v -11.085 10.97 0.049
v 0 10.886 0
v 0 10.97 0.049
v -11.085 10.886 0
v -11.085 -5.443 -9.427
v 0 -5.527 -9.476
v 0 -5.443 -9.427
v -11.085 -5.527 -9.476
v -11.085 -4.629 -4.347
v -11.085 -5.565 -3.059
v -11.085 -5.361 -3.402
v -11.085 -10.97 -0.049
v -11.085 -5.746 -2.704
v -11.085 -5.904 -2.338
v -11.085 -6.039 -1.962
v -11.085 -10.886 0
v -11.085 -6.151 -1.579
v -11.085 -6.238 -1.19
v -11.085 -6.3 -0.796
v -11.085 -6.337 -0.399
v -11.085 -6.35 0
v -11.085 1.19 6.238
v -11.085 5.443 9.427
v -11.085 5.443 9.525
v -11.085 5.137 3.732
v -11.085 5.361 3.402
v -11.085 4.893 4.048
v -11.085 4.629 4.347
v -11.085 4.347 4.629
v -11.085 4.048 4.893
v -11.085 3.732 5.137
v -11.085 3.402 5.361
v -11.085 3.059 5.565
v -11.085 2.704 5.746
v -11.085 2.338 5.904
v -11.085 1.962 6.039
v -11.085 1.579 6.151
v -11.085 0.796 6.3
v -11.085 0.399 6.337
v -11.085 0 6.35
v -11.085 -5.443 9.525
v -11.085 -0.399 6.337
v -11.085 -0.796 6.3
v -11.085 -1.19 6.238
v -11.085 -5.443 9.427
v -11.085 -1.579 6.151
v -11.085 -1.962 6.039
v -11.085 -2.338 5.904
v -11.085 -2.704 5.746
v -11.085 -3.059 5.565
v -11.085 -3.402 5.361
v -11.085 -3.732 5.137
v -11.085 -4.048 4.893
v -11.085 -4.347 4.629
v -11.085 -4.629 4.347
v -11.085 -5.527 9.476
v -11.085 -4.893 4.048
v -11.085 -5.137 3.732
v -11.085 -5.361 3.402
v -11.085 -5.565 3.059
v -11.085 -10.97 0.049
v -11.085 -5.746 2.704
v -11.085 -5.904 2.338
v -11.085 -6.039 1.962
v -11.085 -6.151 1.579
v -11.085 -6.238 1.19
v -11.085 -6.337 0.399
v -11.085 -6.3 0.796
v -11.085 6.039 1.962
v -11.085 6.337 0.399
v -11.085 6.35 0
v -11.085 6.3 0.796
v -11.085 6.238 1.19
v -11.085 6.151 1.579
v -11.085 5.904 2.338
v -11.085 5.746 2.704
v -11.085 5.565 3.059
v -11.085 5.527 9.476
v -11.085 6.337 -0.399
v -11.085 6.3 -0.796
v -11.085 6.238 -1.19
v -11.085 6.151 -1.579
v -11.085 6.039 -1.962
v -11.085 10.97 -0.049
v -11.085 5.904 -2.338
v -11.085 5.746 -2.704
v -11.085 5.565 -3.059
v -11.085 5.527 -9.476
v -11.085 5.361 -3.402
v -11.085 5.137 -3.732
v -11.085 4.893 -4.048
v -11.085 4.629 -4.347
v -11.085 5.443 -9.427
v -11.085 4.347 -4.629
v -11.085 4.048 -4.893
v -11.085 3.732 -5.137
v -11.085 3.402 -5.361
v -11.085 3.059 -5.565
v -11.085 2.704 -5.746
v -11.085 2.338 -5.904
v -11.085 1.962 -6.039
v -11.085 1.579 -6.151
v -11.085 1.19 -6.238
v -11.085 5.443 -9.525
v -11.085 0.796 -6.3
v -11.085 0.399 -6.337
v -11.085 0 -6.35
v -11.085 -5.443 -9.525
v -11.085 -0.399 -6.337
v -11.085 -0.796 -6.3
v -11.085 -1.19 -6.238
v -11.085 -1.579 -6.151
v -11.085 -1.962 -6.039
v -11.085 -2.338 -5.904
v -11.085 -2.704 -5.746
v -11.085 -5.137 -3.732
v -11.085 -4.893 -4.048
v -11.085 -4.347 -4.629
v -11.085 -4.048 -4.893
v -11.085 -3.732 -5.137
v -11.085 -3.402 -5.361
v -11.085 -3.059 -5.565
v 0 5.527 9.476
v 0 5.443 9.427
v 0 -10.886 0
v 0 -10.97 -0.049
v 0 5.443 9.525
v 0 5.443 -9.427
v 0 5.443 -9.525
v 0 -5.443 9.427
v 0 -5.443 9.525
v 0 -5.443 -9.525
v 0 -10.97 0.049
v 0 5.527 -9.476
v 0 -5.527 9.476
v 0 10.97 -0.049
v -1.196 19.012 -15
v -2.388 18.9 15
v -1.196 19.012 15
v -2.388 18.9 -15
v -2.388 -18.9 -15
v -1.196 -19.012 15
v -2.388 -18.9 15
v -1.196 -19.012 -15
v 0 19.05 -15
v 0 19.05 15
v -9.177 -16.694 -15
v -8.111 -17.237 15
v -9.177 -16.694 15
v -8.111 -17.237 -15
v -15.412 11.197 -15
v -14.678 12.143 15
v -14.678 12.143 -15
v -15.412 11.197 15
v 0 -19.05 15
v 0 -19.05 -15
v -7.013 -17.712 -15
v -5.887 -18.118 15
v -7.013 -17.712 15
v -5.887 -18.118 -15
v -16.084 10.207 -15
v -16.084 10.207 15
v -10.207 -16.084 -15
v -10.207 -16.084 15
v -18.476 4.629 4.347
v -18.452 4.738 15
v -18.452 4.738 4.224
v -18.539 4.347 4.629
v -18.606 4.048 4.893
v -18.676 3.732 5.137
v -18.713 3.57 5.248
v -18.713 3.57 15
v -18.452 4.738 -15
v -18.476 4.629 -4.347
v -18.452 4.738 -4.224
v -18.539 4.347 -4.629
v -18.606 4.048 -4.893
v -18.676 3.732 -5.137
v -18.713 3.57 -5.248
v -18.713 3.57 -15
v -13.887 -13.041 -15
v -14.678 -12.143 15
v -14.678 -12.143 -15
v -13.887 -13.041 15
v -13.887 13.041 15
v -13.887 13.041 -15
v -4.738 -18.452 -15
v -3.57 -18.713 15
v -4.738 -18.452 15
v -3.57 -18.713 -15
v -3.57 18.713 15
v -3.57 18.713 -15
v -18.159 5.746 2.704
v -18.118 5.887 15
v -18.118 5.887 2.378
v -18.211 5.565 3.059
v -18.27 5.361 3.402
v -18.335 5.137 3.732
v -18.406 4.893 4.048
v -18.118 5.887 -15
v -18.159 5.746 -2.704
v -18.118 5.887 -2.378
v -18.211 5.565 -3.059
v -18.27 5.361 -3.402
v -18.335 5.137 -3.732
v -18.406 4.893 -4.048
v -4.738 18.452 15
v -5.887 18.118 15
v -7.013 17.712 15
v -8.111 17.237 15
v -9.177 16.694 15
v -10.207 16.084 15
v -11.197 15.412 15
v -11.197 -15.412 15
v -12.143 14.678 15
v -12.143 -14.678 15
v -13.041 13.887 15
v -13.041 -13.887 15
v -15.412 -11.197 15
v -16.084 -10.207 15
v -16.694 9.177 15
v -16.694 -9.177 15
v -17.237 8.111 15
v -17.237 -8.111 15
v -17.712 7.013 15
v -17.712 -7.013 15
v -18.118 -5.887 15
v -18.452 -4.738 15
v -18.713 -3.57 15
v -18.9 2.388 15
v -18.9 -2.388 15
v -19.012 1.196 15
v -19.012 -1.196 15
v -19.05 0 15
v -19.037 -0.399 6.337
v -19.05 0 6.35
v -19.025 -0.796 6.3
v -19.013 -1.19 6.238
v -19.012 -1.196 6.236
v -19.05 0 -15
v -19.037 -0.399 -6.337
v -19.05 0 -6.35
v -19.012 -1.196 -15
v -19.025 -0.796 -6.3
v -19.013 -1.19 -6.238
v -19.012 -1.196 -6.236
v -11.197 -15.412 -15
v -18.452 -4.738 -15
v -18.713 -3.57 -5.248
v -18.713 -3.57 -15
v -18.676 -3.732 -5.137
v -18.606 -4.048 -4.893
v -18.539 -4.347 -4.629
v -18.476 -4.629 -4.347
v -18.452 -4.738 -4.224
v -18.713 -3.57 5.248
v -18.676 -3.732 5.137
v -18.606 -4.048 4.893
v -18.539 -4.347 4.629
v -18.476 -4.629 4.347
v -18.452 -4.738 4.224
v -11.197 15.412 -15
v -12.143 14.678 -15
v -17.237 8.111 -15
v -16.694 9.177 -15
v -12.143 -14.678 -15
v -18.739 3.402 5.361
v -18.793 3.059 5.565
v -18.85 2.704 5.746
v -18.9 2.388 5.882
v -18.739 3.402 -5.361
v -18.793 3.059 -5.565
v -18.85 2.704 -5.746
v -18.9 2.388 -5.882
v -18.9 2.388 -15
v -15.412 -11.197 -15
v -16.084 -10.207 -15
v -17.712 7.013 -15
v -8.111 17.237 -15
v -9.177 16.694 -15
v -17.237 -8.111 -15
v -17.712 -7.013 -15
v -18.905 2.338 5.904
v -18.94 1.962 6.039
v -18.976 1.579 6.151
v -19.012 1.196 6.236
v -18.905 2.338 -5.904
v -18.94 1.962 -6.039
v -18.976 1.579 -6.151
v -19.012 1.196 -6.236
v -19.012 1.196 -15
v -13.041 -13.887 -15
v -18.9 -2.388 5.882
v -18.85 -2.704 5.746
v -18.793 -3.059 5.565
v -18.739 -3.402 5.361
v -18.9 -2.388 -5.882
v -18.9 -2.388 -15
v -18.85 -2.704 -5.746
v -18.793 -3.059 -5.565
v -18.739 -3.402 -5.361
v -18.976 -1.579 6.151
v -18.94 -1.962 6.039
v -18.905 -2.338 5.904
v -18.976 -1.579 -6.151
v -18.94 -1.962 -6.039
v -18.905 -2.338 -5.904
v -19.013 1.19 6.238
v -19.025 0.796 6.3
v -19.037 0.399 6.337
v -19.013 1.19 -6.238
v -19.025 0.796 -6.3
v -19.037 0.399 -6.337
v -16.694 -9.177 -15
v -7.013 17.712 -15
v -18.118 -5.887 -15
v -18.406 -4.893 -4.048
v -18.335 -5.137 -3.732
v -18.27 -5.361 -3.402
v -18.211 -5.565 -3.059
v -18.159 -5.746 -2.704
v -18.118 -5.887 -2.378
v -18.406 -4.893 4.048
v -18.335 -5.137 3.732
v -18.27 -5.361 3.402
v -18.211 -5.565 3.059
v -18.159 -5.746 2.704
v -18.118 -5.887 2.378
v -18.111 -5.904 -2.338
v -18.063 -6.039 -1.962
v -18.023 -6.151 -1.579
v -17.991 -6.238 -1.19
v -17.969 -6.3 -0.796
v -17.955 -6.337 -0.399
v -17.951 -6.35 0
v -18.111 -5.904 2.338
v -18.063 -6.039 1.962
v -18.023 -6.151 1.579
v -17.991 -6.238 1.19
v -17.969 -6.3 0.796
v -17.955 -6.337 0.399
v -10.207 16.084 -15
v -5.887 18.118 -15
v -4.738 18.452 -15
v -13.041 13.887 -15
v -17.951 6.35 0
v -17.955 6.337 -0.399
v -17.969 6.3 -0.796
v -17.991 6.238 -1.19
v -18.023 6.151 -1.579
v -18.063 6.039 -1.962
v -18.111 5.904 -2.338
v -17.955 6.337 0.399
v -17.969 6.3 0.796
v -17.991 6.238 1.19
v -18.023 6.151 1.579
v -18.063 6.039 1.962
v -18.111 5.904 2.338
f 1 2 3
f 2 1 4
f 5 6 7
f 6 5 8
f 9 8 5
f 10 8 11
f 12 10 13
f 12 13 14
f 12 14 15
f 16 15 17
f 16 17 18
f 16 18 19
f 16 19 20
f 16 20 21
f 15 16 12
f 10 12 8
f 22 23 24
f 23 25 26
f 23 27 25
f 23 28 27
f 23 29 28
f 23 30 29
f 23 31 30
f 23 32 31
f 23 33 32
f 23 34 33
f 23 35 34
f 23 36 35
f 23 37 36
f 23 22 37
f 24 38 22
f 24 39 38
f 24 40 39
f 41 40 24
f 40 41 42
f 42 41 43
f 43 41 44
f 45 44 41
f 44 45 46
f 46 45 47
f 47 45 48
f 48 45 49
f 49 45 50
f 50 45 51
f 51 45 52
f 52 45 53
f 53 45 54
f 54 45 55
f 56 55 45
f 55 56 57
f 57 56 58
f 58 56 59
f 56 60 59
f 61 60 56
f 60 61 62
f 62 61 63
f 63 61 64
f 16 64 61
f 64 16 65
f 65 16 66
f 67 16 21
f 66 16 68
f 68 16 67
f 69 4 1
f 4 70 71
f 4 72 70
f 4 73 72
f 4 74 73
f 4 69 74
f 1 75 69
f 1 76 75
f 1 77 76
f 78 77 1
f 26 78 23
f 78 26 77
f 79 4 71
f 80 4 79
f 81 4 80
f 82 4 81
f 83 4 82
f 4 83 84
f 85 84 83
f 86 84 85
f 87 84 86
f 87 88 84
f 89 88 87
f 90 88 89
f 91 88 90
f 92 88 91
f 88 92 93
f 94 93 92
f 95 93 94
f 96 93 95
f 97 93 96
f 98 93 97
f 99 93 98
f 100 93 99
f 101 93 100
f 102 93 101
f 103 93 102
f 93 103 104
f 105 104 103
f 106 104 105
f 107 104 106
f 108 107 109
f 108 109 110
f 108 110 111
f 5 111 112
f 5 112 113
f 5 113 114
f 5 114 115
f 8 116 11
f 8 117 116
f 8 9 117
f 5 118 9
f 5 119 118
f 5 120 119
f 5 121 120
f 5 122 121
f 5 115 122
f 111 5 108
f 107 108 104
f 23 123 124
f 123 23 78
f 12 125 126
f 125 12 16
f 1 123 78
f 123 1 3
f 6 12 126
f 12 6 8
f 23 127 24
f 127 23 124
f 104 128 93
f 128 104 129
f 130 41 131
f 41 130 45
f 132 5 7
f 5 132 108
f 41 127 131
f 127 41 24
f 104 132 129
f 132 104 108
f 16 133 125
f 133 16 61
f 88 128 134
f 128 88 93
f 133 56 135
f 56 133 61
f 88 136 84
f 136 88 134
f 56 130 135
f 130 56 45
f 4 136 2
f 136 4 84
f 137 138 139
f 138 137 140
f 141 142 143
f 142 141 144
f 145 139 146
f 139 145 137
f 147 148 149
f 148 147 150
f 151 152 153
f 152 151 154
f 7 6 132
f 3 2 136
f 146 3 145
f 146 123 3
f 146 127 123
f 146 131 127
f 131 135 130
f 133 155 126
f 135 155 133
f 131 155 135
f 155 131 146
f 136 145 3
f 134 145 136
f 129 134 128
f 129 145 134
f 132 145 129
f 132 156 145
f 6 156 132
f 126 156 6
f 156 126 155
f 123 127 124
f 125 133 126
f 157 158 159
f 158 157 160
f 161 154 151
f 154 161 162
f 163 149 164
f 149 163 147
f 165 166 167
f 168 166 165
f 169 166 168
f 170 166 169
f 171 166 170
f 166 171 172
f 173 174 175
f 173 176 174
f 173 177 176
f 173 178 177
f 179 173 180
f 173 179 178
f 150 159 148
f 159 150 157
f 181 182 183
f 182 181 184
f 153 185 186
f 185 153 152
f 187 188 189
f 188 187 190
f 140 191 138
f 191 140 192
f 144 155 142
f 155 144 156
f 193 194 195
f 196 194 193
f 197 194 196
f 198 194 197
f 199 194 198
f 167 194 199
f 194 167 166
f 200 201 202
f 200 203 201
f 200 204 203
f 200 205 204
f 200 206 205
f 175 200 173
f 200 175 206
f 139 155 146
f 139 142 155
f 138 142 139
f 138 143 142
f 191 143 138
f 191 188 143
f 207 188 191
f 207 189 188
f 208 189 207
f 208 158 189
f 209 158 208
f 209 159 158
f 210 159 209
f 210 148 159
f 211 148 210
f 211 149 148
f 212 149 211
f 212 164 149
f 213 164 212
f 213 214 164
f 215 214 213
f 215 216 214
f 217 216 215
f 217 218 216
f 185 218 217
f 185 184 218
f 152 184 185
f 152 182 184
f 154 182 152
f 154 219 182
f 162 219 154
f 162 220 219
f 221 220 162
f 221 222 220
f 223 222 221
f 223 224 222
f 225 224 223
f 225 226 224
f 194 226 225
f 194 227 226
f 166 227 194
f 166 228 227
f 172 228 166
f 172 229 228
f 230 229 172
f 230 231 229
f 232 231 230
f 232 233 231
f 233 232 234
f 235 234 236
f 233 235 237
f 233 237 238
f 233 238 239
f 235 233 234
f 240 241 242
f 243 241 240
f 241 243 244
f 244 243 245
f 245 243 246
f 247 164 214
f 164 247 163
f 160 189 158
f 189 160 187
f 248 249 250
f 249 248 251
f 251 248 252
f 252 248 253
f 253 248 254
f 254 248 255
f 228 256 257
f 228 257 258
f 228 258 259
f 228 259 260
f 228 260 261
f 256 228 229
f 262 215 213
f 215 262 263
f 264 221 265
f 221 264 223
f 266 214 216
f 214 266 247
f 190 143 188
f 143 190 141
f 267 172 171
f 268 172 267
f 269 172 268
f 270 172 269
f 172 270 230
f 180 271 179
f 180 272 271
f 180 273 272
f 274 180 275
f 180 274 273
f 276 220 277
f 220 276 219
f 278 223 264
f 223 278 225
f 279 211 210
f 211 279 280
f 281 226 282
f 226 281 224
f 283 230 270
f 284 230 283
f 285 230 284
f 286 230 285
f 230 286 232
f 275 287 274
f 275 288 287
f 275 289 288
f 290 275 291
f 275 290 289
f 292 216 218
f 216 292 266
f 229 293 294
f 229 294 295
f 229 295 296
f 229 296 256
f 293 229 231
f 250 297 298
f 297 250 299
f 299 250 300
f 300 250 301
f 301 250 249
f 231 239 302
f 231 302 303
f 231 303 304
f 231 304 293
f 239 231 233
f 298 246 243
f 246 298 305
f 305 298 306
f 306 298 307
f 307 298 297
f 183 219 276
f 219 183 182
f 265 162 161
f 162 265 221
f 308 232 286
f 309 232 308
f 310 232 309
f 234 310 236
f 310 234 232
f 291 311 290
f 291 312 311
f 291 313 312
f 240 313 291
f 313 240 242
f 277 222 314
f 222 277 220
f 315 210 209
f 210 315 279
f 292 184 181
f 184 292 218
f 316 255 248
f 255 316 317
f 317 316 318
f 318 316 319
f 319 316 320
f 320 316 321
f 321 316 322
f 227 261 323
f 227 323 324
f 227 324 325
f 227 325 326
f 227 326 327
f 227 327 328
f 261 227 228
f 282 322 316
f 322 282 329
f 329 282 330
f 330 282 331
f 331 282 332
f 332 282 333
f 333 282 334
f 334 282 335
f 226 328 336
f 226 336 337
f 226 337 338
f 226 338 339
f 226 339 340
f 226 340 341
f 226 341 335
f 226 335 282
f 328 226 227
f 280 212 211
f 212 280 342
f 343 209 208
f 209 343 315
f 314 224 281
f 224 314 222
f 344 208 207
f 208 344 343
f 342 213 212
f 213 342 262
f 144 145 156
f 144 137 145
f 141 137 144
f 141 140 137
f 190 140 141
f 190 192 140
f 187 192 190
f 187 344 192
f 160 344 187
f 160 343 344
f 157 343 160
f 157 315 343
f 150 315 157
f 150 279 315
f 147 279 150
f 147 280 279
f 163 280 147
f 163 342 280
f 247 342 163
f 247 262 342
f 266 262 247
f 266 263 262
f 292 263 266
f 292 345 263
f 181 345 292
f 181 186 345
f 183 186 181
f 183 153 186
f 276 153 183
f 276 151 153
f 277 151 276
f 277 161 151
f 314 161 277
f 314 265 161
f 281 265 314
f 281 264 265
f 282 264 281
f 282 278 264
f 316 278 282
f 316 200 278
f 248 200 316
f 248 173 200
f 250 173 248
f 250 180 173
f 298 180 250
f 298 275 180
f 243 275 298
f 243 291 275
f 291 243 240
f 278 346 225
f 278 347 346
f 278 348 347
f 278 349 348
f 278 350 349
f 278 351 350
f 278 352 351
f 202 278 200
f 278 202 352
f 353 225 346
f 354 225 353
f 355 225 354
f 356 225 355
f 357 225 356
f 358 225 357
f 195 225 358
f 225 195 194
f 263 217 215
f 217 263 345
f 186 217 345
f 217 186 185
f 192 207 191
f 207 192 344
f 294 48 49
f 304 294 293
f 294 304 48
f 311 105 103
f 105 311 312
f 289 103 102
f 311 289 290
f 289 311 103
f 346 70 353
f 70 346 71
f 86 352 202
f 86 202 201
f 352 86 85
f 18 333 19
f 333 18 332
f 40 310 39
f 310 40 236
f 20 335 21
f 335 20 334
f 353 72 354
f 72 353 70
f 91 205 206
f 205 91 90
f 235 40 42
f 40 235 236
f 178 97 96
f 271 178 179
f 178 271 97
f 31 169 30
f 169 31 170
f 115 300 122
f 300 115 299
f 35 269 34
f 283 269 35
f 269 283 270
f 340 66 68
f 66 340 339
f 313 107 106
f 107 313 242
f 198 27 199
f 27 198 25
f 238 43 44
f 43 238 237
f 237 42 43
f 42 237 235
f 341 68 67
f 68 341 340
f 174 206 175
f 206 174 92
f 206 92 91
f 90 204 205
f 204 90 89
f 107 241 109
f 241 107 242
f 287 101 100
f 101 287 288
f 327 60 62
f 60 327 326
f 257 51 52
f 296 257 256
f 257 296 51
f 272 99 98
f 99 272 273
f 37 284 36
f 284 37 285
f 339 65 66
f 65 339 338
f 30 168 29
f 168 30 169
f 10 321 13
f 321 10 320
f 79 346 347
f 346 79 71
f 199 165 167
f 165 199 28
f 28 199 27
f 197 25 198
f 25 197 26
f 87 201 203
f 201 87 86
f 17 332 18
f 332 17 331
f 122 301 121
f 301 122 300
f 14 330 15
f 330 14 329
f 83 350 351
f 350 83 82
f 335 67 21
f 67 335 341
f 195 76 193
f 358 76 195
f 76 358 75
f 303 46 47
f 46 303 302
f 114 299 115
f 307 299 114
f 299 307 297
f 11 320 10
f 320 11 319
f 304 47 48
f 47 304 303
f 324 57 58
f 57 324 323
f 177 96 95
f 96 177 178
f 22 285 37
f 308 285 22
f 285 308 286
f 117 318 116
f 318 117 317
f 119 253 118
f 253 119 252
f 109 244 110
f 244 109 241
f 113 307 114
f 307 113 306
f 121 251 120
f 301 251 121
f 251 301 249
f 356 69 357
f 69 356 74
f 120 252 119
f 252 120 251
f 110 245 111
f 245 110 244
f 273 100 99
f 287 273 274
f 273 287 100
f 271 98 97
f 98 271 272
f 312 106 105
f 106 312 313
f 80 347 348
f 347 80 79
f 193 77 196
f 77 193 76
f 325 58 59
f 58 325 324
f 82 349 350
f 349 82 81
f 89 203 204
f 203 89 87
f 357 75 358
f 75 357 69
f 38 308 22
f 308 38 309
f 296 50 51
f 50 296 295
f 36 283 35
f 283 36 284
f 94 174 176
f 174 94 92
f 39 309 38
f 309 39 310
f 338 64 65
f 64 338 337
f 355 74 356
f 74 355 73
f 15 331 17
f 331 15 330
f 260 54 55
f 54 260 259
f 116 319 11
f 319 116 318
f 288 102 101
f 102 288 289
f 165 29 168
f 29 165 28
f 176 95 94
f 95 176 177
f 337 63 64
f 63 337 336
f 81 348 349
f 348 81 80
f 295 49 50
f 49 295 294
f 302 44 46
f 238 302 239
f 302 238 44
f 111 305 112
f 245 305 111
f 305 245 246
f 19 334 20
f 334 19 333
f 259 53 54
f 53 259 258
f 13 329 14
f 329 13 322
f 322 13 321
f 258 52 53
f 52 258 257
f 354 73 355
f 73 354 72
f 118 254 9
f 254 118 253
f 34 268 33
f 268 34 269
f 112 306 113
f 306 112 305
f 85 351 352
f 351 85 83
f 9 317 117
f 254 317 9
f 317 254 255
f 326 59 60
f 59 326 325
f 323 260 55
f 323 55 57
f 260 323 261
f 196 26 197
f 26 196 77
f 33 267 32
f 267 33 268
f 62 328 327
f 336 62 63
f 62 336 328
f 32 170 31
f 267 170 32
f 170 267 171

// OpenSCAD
$fn=100;
diameter_of_washer=38.1; // Diameter of Half Moon
height_of_washer=30.0; // Height of Half Moon
hole_diameter=12.7; // Hole Diameter
nut_depth=11.1125; // Nut Depth
nut_width=19.05; // Nut Width

difference(){
    linear_extrude(center=true, height=height_of_washer){
        difference(){
            circle(d=diameter_of_washer);
            translate([0,-diameter_of_washer,0]){
                square(diameter_of_washer*2);
            }
        }
    }
    rotate([0,90,0]){
        translate([0,0,-height_of_washer/2]){
            cylinder(h=height_of_washer, d1=hole_diameter, d2=hole_diameter, center=true);
        }
    }
    translate([-nut_depth/2.01,0,0]){
        rotate([0,90,0]){
            rotate([0,0,90]){
                hexagon(nut_width,nut_depth);
        
            }
        }
    }
}

module hexagon(size, height) {
  boxWidth = size/1.75;
  for (r = [-60, 0, 60]) rotate([0,0,r]) cube([boxWidth, size, height], true);
}
